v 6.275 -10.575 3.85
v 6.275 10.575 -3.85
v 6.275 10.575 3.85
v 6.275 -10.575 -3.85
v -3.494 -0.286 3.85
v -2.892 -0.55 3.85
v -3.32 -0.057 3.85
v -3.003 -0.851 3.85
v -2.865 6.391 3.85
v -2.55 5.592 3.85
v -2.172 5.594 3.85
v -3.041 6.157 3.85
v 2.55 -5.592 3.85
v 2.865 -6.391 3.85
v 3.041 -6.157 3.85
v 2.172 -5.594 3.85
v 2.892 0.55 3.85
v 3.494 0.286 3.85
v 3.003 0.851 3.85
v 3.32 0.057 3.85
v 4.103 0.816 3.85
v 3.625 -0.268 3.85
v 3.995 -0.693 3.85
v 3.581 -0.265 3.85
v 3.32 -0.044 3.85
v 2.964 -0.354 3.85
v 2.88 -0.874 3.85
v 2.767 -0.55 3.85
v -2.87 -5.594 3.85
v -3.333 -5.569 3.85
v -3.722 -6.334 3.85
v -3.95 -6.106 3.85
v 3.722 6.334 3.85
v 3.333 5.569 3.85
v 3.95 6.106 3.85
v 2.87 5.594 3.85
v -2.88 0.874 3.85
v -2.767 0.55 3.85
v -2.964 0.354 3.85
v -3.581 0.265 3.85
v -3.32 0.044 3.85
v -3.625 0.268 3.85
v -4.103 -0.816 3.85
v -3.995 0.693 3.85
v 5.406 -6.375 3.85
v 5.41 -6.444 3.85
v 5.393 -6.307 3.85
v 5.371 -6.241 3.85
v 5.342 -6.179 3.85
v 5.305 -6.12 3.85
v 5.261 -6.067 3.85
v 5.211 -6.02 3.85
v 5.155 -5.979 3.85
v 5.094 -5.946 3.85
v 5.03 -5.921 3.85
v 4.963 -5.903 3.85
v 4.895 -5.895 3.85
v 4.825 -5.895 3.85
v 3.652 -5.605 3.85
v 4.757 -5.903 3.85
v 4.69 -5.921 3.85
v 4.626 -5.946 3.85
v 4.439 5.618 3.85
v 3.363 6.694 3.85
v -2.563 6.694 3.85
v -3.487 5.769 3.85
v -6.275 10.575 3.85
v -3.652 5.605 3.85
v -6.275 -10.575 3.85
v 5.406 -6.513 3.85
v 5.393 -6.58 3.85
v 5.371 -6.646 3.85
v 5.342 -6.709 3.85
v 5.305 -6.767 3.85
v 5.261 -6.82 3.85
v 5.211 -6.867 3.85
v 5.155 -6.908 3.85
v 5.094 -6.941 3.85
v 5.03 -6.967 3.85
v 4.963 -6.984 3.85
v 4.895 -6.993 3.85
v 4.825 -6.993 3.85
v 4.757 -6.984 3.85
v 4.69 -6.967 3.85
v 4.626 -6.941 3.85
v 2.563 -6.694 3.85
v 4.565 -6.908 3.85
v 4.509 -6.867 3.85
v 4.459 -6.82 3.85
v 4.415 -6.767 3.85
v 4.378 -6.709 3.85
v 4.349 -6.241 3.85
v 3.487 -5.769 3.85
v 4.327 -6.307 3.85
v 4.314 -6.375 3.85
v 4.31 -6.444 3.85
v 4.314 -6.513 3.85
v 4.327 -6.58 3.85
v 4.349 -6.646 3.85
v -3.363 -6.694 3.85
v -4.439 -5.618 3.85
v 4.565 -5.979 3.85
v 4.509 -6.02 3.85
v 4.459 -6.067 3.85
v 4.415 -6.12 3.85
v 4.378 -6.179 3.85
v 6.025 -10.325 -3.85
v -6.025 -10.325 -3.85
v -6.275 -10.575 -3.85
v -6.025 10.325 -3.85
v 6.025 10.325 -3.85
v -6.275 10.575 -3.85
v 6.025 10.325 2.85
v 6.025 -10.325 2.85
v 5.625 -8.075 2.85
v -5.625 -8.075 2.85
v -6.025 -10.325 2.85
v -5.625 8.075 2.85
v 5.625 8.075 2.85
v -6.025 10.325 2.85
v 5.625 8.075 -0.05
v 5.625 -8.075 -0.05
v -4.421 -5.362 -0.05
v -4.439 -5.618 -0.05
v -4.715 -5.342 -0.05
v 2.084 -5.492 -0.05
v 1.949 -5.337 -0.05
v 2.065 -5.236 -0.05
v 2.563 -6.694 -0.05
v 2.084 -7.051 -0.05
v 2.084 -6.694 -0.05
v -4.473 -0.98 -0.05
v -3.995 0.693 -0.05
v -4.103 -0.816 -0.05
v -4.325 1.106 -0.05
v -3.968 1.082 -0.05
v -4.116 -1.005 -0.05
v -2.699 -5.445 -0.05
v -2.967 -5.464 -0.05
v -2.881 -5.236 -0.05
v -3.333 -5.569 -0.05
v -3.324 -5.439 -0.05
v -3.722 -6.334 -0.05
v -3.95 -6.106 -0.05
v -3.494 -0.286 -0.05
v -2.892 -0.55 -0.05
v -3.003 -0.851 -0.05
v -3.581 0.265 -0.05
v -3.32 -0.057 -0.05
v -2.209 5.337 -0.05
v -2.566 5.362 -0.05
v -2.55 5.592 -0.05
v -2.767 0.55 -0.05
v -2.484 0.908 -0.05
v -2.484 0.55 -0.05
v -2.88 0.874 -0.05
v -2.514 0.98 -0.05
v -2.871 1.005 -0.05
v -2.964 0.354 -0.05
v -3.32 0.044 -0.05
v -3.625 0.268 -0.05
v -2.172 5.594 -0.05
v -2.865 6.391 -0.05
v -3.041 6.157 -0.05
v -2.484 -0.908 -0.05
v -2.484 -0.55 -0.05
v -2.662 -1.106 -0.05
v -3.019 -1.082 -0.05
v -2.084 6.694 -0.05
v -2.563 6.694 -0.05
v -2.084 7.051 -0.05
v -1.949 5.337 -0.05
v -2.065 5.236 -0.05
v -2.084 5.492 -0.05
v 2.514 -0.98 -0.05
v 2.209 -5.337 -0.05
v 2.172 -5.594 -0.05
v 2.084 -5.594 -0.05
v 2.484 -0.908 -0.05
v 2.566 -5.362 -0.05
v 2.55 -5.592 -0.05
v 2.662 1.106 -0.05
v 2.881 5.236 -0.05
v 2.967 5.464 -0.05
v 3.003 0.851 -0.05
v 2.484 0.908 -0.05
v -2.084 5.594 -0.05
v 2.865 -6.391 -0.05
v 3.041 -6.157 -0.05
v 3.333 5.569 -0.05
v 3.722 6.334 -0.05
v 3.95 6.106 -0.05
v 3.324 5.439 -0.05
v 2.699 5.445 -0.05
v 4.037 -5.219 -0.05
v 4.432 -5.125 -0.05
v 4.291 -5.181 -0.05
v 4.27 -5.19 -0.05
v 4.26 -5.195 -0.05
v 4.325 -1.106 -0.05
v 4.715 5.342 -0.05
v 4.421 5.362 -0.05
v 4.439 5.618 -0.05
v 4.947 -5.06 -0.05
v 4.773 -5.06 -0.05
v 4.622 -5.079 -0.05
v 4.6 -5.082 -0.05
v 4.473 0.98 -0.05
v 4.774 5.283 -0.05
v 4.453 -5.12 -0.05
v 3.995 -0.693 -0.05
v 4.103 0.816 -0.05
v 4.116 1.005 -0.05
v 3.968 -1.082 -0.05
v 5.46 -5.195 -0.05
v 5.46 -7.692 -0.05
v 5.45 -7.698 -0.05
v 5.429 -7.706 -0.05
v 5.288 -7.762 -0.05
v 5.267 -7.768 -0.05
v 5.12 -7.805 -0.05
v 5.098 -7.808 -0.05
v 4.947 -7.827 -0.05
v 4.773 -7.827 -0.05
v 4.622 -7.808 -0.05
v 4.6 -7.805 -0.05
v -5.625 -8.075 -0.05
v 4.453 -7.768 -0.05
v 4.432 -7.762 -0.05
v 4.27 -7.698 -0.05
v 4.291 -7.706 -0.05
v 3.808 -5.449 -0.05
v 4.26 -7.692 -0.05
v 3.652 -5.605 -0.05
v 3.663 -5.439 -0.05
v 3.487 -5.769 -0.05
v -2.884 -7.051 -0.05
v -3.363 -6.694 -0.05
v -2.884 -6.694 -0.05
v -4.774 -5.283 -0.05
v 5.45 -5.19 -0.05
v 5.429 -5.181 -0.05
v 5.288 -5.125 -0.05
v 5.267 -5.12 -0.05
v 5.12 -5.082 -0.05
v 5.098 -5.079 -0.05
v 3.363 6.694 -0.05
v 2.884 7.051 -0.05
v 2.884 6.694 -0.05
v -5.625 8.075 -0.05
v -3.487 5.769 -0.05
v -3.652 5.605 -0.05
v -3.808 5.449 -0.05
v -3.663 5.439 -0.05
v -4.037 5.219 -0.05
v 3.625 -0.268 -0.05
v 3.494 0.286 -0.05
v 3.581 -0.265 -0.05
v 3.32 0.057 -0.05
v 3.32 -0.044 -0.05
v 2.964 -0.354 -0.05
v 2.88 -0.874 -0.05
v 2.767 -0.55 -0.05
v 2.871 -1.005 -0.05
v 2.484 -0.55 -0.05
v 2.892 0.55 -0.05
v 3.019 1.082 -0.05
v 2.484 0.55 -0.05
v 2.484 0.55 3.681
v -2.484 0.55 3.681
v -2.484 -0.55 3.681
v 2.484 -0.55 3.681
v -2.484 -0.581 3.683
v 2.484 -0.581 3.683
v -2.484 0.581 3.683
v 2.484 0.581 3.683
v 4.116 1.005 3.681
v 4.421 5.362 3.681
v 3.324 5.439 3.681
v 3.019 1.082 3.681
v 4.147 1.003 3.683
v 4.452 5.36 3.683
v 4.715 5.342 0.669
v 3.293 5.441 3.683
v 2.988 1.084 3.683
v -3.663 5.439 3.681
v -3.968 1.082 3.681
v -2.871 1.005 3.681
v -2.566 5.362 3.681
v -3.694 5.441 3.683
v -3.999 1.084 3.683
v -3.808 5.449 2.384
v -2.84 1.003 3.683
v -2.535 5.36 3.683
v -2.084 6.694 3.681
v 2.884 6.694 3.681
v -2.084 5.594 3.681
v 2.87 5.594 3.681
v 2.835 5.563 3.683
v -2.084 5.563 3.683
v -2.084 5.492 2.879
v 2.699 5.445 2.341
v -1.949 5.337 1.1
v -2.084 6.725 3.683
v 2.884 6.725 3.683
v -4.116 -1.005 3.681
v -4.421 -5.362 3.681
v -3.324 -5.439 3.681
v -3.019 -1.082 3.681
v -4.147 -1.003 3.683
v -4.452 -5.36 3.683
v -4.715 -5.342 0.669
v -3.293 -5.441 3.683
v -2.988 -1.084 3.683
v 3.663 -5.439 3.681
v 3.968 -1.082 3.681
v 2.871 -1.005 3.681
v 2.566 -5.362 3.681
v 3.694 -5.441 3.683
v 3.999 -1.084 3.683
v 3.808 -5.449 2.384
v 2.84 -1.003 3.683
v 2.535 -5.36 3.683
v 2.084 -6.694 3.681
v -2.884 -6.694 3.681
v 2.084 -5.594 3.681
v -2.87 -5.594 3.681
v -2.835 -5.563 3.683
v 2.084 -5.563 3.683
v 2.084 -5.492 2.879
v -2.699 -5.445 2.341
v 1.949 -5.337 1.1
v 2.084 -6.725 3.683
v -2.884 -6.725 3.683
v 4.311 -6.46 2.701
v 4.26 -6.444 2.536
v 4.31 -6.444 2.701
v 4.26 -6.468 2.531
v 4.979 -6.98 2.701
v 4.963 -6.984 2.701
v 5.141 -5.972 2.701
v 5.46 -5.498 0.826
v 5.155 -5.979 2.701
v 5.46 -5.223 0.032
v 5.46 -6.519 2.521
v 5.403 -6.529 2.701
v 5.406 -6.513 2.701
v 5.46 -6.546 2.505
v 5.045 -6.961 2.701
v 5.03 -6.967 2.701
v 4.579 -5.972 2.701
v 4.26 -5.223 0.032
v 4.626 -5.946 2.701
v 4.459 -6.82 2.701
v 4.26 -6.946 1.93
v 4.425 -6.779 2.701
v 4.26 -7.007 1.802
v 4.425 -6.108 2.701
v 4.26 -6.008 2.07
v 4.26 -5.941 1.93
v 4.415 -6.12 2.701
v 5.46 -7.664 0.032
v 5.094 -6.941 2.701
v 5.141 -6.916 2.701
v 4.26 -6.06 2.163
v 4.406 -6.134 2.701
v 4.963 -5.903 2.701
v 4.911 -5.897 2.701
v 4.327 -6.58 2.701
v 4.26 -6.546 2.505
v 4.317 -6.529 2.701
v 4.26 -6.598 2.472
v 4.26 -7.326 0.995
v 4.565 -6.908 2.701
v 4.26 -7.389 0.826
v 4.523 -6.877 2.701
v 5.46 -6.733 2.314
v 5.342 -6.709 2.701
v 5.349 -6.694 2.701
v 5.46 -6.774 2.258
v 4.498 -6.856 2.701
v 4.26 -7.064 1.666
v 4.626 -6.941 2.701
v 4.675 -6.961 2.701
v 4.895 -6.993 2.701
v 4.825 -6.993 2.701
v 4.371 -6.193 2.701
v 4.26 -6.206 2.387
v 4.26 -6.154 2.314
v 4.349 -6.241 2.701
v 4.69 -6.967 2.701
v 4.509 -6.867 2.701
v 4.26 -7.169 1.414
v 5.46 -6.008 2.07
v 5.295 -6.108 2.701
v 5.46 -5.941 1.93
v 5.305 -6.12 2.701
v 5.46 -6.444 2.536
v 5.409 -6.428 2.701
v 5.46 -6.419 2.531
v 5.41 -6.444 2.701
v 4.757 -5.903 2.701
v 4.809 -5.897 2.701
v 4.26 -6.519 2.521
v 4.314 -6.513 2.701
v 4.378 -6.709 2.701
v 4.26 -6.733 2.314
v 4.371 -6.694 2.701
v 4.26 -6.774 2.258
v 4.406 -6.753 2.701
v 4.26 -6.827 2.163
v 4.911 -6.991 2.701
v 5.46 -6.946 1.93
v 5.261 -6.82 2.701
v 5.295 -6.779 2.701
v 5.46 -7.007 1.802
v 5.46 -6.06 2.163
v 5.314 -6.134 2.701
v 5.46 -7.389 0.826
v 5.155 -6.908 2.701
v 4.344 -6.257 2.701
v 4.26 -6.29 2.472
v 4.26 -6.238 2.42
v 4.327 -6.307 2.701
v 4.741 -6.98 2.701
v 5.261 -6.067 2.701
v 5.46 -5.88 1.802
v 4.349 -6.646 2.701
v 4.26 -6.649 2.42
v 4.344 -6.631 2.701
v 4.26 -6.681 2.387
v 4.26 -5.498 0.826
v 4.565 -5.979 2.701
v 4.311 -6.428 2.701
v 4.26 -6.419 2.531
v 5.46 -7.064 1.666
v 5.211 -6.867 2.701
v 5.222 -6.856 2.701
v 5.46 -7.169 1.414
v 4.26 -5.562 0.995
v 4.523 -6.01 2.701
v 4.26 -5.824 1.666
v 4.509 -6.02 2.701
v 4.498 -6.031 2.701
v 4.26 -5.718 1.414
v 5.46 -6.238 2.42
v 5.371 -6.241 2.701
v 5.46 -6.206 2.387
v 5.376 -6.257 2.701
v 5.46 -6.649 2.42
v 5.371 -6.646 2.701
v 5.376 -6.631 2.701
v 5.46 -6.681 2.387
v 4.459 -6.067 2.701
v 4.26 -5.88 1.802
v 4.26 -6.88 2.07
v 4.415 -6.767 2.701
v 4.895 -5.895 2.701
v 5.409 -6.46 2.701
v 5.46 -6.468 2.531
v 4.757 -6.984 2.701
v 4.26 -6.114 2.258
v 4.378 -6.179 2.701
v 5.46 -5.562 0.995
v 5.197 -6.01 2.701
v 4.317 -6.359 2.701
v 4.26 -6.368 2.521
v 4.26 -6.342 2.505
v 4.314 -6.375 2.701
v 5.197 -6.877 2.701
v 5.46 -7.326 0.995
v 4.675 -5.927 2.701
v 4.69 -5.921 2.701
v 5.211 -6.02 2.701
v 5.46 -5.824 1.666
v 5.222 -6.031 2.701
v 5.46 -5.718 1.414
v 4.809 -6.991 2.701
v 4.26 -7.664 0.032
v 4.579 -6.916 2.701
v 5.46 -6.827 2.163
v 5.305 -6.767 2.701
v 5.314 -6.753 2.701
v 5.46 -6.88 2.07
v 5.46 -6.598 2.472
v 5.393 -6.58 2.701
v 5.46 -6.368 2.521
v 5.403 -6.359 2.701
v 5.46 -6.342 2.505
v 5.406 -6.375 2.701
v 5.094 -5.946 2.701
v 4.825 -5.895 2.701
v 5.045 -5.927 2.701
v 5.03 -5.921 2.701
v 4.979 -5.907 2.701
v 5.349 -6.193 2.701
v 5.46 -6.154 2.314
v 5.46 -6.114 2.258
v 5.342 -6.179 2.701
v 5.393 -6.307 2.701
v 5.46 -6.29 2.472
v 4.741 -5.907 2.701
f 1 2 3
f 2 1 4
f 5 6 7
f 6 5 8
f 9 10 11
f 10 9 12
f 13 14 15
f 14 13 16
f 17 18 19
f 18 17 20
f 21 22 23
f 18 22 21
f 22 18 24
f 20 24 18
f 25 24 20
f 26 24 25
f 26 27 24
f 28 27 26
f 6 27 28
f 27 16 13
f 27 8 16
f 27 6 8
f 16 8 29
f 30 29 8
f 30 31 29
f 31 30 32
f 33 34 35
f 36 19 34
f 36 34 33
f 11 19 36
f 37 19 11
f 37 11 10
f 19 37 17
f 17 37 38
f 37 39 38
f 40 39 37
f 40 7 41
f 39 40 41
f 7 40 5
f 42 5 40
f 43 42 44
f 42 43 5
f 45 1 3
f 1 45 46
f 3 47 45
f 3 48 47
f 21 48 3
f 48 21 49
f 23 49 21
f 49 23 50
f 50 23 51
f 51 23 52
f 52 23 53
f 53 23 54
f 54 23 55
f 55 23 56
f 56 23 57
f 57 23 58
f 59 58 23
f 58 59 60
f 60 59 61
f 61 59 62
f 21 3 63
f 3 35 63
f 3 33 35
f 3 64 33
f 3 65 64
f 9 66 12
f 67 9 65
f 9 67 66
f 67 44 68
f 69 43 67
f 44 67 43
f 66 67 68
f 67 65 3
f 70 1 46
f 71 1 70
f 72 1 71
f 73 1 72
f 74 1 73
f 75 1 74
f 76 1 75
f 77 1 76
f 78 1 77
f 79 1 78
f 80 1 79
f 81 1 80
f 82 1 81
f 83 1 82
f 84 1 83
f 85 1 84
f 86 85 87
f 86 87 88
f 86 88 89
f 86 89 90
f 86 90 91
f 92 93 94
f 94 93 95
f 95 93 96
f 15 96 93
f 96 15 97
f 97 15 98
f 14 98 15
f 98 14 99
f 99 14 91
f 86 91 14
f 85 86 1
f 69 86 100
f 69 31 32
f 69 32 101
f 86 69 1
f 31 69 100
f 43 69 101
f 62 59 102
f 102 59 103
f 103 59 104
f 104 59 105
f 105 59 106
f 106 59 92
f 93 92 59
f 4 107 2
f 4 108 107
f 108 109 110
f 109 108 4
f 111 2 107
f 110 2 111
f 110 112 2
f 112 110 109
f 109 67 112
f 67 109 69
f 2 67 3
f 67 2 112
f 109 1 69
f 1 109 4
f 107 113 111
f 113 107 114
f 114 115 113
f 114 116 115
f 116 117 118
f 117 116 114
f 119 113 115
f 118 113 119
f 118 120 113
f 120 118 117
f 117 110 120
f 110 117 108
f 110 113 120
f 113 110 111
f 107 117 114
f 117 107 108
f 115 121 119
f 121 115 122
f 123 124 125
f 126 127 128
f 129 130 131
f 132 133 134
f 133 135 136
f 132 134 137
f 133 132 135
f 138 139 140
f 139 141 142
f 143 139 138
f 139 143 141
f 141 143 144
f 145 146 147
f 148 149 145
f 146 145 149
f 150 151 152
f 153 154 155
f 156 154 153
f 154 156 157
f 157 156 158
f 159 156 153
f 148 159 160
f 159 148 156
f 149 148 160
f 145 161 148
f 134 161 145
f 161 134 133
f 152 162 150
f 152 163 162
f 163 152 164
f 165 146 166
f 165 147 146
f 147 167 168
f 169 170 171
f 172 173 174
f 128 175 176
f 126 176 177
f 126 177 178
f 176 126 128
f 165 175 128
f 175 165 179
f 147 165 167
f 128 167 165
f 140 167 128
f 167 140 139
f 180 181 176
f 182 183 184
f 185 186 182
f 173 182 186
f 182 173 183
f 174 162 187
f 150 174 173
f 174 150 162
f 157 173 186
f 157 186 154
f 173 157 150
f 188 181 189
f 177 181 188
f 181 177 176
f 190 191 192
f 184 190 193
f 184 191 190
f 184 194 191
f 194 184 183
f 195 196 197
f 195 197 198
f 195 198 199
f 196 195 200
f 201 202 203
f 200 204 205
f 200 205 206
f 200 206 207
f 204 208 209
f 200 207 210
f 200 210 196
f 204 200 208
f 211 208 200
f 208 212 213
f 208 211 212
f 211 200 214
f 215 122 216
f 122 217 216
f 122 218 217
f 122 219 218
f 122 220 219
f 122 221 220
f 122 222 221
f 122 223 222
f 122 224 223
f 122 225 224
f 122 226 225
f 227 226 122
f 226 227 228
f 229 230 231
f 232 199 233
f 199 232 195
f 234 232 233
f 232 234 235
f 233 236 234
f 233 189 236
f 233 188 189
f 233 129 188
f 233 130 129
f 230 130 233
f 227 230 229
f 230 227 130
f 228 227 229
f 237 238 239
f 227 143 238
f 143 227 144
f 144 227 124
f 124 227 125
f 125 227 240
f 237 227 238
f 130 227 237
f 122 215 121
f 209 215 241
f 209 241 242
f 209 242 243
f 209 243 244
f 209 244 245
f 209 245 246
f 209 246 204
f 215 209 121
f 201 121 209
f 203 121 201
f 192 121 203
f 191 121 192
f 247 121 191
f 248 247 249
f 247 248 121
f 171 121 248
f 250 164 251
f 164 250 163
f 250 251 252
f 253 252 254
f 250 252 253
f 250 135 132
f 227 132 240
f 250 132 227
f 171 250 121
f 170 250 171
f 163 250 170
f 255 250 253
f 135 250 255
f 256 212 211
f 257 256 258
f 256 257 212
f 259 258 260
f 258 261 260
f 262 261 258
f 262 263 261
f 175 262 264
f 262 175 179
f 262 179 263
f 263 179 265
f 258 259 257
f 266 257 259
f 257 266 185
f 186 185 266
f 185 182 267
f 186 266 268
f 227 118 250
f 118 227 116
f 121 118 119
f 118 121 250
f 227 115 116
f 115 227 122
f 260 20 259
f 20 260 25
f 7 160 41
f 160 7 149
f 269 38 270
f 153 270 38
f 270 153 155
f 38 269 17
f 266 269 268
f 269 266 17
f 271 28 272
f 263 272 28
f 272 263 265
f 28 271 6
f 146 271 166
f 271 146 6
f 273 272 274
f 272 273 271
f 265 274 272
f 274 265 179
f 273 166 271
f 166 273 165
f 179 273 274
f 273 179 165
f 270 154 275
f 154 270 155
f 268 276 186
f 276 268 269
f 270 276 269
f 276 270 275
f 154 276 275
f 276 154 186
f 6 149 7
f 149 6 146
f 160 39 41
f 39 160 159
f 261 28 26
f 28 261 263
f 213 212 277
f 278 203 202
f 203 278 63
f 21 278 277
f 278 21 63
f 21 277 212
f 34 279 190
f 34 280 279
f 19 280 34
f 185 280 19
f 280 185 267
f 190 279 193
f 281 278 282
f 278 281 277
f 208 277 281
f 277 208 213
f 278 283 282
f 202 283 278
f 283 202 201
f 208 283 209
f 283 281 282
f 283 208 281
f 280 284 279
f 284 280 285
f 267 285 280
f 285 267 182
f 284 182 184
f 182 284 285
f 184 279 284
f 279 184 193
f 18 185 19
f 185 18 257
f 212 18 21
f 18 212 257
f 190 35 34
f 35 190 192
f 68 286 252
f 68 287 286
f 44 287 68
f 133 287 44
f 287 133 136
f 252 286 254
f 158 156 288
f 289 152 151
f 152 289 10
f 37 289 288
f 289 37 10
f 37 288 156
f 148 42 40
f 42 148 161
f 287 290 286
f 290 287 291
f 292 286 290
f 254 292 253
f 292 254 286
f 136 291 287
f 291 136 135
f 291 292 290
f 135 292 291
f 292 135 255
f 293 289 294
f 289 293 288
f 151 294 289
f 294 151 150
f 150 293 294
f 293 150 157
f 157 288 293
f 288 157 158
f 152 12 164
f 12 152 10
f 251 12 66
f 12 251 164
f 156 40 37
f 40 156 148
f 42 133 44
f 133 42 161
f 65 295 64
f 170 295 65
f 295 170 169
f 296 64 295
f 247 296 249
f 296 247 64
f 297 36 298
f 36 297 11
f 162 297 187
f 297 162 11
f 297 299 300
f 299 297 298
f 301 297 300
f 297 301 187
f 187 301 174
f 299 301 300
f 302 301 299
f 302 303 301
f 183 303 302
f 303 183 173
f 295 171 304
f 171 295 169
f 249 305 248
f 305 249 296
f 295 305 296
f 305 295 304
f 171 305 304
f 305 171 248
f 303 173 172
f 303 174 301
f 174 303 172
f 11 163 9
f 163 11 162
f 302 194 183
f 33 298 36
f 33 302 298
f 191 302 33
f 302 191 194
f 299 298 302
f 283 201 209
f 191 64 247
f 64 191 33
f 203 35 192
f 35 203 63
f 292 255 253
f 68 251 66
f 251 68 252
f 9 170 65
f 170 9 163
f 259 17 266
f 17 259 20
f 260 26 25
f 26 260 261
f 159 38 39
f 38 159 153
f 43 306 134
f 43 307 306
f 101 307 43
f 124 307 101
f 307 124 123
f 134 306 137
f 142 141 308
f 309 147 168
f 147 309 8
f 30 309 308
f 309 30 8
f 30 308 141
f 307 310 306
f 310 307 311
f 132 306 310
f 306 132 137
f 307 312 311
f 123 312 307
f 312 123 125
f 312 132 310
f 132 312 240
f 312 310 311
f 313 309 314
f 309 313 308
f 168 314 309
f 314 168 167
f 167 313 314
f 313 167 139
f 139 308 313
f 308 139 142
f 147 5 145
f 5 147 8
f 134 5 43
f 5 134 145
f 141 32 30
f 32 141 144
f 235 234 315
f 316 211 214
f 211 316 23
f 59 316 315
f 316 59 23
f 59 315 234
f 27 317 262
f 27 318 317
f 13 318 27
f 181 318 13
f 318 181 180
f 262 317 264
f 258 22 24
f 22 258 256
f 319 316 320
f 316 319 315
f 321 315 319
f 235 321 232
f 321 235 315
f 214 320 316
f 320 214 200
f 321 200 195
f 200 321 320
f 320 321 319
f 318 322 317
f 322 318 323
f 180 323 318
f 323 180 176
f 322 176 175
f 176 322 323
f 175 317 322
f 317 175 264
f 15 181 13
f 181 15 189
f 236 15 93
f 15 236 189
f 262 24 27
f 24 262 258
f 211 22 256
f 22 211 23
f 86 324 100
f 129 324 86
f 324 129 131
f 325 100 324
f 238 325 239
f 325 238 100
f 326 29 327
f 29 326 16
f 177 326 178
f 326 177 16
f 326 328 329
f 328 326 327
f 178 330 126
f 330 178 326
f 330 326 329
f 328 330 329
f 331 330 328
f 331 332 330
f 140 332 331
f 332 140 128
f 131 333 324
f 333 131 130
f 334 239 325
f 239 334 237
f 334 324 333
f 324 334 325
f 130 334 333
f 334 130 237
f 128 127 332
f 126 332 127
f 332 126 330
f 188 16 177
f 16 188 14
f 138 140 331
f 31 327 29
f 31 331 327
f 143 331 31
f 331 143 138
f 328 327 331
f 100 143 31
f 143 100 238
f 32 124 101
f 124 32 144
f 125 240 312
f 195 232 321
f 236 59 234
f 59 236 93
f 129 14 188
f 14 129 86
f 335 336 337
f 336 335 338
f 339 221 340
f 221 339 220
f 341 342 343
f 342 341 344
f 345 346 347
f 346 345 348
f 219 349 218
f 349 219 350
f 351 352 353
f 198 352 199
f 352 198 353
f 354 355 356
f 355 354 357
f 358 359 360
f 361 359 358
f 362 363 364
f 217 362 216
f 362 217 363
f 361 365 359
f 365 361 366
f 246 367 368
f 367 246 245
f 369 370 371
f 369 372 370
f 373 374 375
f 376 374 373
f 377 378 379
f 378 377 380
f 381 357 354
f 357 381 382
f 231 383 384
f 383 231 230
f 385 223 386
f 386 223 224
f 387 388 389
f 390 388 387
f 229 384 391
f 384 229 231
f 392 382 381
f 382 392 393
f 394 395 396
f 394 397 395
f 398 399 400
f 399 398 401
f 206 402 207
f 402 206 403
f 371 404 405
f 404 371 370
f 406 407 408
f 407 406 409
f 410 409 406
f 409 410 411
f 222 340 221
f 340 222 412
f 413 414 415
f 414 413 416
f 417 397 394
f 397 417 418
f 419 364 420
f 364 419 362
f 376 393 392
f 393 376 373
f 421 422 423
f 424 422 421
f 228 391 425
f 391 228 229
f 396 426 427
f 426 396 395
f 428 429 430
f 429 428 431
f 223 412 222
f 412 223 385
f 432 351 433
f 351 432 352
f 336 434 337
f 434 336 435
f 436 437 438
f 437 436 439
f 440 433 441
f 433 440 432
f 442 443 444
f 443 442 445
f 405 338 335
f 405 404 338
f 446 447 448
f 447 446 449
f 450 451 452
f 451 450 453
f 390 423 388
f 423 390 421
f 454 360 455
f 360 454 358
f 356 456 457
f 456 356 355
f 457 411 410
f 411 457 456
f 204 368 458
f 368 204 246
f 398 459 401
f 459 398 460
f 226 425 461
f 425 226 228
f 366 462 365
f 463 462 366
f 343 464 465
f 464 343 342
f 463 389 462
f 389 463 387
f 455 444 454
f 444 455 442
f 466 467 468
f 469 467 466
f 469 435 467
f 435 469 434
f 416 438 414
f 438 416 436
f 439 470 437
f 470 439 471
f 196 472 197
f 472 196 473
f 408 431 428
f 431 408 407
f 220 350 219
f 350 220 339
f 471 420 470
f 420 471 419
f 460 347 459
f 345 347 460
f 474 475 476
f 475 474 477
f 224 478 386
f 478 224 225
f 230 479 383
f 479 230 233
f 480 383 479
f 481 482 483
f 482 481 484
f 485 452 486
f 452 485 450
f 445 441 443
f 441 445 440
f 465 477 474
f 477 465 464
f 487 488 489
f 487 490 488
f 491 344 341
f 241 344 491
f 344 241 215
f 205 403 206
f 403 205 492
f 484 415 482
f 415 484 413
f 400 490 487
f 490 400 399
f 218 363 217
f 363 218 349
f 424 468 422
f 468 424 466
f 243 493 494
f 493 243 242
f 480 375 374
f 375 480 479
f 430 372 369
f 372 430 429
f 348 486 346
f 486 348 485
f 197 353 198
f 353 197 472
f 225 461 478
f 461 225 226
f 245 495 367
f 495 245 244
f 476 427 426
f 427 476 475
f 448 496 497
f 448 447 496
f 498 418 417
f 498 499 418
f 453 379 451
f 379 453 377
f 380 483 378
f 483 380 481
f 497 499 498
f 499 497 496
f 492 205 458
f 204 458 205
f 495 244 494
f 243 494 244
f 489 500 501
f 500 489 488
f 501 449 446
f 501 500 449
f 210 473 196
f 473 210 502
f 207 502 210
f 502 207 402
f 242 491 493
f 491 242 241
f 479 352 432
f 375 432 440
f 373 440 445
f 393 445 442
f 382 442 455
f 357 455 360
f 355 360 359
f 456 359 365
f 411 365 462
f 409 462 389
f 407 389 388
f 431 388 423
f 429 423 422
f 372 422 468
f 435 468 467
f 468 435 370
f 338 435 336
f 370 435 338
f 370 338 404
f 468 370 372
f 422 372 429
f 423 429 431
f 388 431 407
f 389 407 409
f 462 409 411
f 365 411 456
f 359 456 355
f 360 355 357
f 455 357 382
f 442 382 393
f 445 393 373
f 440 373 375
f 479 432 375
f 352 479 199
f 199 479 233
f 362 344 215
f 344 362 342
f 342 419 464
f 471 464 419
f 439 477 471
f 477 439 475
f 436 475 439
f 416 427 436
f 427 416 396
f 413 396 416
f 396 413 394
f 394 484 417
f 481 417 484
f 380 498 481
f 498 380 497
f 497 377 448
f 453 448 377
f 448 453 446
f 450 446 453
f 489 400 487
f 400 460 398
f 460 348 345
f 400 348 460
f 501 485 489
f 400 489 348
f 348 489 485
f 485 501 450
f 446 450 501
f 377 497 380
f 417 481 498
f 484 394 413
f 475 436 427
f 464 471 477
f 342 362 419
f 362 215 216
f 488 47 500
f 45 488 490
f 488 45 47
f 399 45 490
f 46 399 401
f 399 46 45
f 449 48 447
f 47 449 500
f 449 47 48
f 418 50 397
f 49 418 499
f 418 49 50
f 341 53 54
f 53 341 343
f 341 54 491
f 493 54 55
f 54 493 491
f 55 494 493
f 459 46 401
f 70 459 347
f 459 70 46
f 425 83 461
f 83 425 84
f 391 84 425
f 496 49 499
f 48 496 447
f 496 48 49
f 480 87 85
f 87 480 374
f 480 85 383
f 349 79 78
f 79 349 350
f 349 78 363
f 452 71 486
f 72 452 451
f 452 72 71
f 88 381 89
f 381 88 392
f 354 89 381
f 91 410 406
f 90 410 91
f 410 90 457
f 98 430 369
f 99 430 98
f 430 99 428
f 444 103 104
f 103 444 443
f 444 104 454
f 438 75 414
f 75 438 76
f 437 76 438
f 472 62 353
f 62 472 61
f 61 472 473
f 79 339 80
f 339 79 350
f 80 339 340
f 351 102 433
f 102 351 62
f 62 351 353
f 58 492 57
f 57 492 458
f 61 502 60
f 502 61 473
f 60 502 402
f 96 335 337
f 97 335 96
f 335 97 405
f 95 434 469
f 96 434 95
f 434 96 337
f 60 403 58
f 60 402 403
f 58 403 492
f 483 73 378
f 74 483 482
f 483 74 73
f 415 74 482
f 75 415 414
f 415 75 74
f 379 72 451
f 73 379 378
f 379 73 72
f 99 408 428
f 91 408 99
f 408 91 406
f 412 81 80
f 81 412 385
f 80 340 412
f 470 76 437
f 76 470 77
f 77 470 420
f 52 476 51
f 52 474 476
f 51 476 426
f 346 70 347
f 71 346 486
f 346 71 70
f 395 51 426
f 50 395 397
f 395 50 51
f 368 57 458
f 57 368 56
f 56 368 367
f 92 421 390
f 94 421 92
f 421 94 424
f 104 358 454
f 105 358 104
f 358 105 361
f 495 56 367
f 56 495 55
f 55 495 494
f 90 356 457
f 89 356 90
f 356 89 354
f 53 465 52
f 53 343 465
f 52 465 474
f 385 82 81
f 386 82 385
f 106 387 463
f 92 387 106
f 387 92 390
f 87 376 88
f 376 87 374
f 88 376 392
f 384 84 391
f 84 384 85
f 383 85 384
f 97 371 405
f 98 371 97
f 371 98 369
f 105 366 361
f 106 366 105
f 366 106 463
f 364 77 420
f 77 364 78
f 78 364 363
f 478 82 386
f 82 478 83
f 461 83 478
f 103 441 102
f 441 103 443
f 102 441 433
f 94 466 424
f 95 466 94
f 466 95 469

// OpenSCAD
$fn=50;
$t=true;        //Abbreviation
$angle=45;
$wth=.5;        //Wall Thickness
$l=21.15;       //Length
$w=12.55;       //Width
$h=7.7;         //Height
$slant=4;       //Slant of segments in degrees
$slo=0.453;     //Slant offset
$ow=5;          //LED Opening Width
$oiw=3.5;       //LED Opening Inside Width
$ol=1.1;        //LED Opening length
$os=.5;         //LED Opening Spacing
$ols=$ol+$os;   //Distance per LED
$olso=$ols/2;   //Offset for Center
$od=6;          //LED Opening Depth
$al=2.82;       //A half length
$bl=5.9437;     //B length
$gl=$al;        //G half length
$ledl=3.4;      //LED Length
$ledw=1.2;      //LED Width
$ledhf=.6;      //Flat LED Height
$ledhr=1;       //Round LED Height/diameter
$ledpcbh=.48;   //LED PCB Height

/* Display layout
        A
    ==========
  ||          ||
  ||          ||
F ||          || B
  ||          ||
  ||    G     ||
    ==========
  ||          ||
  ||          ||
B ||(mirrored)|| F (mirrored)
  ||          ||
  ||          ||
    ==========    o DP
        A (mirrored)
*/

module LEDConduit() {
    translate([0,0,-$ledpcbh*3]) rotate([0,0,90]) cube([$ledw,$ledl,$ledpcbh], center=$t);
    difference() {
        translate([0,0,$ledpcbh]) rotate([0,0,90]) cylinder(h=$ledl*1.5,r1=2,r2=$ledhf-.15, center=$t);
        translate([0,$ledw+.12,$ledpcbh]) rotate([90,0,0]) cube([$ledl*1.5,$ledw*5,$ledpcbh*3], center=$t);
        translate([0,-$ledw-.12,$ledpcbh]) rotate([90,0,0]) cube([$ledl*1.5,$ledw*5,$ledpcbh*3], center=$t);
    }
}

module A() {
    difference() {
        union() {
            cube([$gl*2.4,$ol,$od], center=$t);
            translate([0,-.5,-1.4]) rotate([-5,0,0]) cube([$gl*2.4-1.8,$ol-.5,$od-1], center=$t);
            translate([0,.5,-1.4]) rotate([5,0,0]) cube([$gl*2.4-1.8,$ol-.5,$od-1], center=$t);
        }
        translate([-3.1,-.4,0]) rotate([0,0,-$angle-$slant]) cube([1.6,.6,$od], center=$t);
        translate([3.1,-.4,0]) rotate([0,0,$angle-$slant]) cube([1.6,.6,$od], center=$t);
    }
}

module G() {
    difference() {
        union() {
            cube([$gl*2+1,$ol,$od], center=$t);
            translate([0,-.5,-1.4]) rotate([-5,0,0]) cube([$gl*2.4-1.8,$ol-.5,$od-1], center=$t);
            translate([0,.5,-1.4]) rotate([5,0,0]) cube([$gl*2.4-1.8,$ol-.5,$od-1], center=$t);
        }
        translate([-3.2,-.5,0]) rotate([0,0,-$angle-$slant]) cube([1.1,.4,$od], center=$t);
        translate([-3.1,.5,0]) rotate([0,0,$angle-$slant]) cube([1.1,.4,$od], center=$t);
        translate([3.1,-.5,0]) rotate([0,0,$angle]) cube([1,.4,$od], center=$t);
        translate([3.1,.5,0]) rotate([0,0,-$angle]) cube([1,.4,$od], center=$t);
    }
}

module B() {   
    difference() {
        union() {
            cube([$ol,$bl,$od], center=$t);
            translate([.5,0,-1.4]) rotate([-5,0,90]) cube([$gl*2.4-2.4,$ol-.5,$od-1], center=$t);
            translate([-.5,0,-1.4]) rotate([5,0,90]) cube([$gl*2.4-2.4,$ol-.5,$od-1], center=$t);
        }
        translate([-.6,-($bl/2)-.1,0]) rotate([0,0,-$angle]) cube([1.2,1,$od+.1], center=$t);
        translate([.7,-($bl/2)-.1,0]) rotate([0,0,-$angle]) cube([1.2,1,$od+.1], center=$t);
        translate([-.5,($bl/2)+.1,0]) rotate([0,0,-$angle]) cube([1,1.2,$od+.1], center=$t);
        translate([.9,($bl/2)+.1,0]) rotate([0,0,-$angle]) cube([1,1.2,$od+.1], center=$t);
    }
}

module F() {
    rotate([0,0,180]) B();
}

module DP() {
    cylinder(h=$od,r=$ol/2, center=$t);
}

module TopOpenings() {      //Arrange & Consolidate top half segments
    translate([0,0,$h/3]) G();                                                                  //LED G
    difference() {
        union() {
            translate([$gl+$os*1.8,$bl/2+$os/2,$h/3]) rotate([0,0,-$slant]) B();                //LED B
            translate([-($gl+$os*1.8)+$slo,$bl/2+$os/2,$h/3]) rotate([0,0,-$slant]) F();        //LED F
            translate([0.4,$bl+$os-.3,$h/3]) A();                                               //LED A
        }
        translate([$gl+$os*3,$bl+$os,$h/3]) rotate([0,0,-$angle]) cube([3,1,$od+1], center=$t);
        translate([-($gl+$os+.2),$bl+$os,$h/3]) rotate([0,0,$angle]) cube([3,1,$od], center=$t);
    }
    
}

module BottomOpenings() {       //Duplicate top half segments & mirror to make bottom half
    rotate([0,0,180]) TopOpenings();
}

module DigitOpenings() {        //Combine Top & Bottom with DP to make a full digit
    TopOpenings();
    BottomOpenings();
    translate([($gl+$os)/2+3.2,-($bl+$os),$h/3]) DP();
    translate([($gl+$os)/2+3.2,-($bl+$os),0]) rotate([0,0,90]) LEDConduit();
}

module Casing() {
    difference() {
        cube([$w,$l,$h], center=$t);                                        //Main casing
        translate([0,0,-$wth*2]) cube([$w-$wth,$l-$wth,$h], center=$t);     //Hollow out casing
    }
    translate([0,0,1.9]) cube([$w-1.3,$l-5,3.9], center=$t);     //Add 
}


difference() {                  //Bring it all together
    Casing();
    DigitOpenings();
}
